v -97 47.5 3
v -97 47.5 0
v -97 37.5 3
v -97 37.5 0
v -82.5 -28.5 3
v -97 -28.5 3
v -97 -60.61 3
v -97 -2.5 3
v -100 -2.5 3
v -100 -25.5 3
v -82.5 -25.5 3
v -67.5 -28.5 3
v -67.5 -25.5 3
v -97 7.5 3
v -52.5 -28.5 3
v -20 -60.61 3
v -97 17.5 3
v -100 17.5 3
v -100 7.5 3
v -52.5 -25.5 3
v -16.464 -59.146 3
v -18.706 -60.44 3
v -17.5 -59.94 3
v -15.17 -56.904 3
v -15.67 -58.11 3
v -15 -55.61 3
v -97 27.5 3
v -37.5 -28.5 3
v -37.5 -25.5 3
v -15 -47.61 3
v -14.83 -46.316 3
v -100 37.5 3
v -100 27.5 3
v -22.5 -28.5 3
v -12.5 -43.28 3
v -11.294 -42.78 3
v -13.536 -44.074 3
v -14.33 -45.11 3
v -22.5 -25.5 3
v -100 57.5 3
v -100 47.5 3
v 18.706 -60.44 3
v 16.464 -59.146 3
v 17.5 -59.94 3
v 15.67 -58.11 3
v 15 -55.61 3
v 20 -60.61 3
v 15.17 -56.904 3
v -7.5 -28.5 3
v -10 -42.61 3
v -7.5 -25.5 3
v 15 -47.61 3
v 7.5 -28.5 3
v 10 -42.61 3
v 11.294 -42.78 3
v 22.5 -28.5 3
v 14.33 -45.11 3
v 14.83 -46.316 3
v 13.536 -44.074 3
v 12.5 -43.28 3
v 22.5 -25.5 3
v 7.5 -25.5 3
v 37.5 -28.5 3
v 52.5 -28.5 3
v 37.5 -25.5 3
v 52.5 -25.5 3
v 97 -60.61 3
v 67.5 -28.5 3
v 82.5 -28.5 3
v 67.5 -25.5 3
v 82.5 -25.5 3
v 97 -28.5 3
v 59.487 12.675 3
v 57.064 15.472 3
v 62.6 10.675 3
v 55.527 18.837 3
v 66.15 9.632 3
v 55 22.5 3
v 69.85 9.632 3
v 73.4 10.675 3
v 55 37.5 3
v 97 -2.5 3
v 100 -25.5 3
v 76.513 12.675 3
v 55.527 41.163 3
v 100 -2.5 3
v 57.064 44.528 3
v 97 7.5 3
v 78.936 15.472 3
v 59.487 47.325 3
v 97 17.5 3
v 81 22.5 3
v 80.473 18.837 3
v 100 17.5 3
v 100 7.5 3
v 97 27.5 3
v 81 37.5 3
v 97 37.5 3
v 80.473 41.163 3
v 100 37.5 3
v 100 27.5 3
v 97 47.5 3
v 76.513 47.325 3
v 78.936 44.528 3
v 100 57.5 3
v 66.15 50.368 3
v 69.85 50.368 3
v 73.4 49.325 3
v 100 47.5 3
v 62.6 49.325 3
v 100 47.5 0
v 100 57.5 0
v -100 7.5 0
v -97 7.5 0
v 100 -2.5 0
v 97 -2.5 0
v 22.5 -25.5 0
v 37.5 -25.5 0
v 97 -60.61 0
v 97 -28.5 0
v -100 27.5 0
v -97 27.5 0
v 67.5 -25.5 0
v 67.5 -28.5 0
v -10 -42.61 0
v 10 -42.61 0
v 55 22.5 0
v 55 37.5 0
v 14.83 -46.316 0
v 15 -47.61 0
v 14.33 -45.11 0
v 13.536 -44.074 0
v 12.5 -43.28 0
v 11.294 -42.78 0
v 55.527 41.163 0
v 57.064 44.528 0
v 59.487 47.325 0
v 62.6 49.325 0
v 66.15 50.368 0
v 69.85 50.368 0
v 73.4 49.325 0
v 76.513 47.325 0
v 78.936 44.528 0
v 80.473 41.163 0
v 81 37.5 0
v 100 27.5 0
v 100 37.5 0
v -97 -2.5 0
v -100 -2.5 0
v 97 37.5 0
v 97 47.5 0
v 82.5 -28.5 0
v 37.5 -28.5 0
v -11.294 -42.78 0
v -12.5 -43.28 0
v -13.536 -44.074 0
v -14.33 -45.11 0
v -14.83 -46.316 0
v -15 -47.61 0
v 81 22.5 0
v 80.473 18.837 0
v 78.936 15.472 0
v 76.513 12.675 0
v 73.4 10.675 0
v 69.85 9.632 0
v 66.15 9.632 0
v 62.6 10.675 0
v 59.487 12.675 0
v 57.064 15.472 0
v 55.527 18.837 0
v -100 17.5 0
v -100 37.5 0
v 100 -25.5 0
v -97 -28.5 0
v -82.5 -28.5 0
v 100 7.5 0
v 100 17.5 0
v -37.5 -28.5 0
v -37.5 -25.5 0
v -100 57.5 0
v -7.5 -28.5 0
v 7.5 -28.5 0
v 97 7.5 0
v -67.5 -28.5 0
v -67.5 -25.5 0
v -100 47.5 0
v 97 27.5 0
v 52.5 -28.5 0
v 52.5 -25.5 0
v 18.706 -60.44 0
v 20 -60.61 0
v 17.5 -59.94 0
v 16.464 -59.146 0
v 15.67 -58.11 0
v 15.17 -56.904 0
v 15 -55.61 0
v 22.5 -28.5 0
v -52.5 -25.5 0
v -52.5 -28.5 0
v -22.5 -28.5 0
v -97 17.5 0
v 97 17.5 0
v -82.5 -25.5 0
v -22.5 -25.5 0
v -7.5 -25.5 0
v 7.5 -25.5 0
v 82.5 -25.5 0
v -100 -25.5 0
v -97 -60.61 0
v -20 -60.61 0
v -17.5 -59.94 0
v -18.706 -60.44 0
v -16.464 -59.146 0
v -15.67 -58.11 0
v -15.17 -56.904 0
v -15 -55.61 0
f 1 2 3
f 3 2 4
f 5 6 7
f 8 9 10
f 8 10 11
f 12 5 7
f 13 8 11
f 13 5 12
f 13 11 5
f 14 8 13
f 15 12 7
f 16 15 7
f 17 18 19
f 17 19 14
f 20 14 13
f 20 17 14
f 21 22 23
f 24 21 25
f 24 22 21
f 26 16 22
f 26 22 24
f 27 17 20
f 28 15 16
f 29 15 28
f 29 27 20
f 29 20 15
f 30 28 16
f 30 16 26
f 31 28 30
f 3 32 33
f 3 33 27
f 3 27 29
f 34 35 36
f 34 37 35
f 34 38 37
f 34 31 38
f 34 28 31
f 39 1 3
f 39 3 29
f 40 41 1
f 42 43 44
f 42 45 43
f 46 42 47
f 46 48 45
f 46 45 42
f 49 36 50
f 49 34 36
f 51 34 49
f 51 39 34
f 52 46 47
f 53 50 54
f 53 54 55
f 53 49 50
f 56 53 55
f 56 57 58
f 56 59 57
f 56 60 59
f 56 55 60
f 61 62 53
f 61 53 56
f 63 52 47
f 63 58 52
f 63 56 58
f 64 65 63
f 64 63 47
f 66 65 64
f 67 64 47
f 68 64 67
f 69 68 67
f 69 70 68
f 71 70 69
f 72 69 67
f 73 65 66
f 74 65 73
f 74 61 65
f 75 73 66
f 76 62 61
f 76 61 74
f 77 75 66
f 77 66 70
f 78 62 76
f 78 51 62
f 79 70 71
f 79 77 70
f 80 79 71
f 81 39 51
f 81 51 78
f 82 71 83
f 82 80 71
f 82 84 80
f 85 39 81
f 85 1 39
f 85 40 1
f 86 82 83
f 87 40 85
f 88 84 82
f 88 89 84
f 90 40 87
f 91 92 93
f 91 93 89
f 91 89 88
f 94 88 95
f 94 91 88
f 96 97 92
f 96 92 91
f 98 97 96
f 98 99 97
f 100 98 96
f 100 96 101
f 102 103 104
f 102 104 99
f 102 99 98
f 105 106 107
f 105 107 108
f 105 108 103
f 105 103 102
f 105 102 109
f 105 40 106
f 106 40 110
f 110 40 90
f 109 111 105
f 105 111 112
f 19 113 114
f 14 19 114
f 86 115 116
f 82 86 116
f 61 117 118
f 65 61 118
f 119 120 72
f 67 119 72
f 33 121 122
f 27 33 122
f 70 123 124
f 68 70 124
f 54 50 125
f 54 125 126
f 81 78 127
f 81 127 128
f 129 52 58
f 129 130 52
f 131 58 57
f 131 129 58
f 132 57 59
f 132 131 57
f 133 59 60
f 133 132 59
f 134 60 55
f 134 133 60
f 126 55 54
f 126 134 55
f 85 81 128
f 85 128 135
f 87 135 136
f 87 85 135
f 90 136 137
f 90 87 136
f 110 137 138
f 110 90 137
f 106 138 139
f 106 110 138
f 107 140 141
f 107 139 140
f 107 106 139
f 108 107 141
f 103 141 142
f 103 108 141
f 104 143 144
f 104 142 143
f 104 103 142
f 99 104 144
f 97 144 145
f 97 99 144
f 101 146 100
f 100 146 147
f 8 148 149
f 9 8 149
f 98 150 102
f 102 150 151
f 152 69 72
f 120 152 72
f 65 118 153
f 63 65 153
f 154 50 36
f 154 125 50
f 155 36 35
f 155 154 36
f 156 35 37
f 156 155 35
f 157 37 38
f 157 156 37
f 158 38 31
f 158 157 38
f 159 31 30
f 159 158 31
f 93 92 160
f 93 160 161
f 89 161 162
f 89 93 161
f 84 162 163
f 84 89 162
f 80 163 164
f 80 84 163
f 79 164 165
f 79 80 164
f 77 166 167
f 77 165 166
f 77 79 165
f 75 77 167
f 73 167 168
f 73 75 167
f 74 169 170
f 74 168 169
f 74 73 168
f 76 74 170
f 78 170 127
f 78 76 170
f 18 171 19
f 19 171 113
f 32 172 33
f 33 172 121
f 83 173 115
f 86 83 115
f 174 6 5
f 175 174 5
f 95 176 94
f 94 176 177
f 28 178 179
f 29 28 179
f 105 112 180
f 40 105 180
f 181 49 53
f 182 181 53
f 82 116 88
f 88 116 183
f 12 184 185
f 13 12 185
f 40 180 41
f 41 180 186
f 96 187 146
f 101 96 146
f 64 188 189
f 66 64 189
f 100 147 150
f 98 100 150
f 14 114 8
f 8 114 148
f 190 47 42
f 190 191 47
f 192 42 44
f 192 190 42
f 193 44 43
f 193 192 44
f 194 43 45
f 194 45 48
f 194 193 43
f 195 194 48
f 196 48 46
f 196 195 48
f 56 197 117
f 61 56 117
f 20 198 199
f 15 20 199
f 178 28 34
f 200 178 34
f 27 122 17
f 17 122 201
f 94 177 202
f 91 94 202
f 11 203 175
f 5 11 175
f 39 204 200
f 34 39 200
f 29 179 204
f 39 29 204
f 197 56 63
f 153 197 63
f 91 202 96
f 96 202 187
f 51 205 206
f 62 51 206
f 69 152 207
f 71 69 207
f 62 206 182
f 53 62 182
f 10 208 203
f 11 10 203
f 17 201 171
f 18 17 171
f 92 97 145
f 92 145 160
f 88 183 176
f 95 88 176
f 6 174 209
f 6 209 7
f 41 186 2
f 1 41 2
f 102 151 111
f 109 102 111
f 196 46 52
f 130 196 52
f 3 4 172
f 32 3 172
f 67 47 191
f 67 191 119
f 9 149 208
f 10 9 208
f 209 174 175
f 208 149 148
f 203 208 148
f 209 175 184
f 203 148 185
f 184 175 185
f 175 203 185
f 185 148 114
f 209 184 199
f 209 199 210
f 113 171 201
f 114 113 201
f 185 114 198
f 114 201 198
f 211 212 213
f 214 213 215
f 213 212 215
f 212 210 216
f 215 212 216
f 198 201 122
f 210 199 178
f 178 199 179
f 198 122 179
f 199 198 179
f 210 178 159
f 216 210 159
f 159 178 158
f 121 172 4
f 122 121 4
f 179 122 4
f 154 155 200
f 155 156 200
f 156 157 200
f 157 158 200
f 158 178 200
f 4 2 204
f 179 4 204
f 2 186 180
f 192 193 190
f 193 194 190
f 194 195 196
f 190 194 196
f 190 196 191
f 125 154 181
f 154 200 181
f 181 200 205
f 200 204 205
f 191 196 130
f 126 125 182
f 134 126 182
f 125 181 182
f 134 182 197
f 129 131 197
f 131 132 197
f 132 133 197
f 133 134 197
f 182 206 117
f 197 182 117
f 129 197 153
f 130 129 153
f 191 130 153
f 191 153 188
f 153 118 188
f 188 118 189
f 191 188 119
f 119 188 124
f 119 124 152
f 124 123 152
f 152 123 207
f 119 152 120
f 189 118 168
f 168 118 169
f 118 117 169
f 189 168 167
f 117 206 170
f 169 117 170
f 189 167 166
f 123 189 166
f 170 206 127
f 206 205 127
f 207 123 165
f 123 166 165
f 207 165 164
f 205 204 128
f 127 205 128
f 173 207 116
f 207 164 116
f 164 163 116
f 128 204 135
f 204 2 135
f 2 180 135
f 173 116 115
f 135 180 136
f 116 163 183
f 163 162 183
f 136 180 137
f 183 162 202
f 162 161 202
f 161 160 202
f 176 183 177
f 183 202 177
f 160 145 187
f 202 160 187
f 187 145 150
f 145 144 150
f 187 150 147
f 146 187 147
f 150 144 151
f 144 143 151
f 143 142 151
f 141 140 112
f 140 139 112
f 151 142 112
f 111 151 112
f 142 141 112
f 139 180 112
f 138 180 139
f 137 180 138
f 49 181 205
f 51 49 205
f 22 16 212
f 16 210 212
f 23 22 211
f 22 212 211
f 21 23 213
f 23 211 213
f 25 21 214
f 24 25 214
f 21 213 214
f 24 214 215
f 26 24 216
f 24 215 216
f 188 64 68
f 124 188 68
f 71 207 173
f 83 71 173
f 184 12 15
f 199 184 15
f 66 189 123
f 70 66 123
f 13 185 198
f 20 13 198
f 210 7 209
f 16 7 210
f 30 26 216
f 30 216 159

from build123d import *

# Parameters (mm, degrees)
BOSS_EXTRUDE1_DEPTH = 3
CUT_EXTRUDE1_DEPTH  = 10
SKETCH3_W           = 194
SKETCH3_H           = 3
BOSS_EXTRUDE2_DEPTH = 32.11
SKETCH4_W           = 30
SKETCH4_H           = 18
CUT_EXTRUDE2_DEPTH  = 22
FILLET1_R           = 5
FILLET2_R           = 5


with BuildPart() as part:
    # Sketch1 → Boss-Extrude1 (new body)
    with BuildSketch(Plane.XY):
        Polygon((100, -2.5), (97, -2.5), (97, 7.5), (100, 7.5), (100, 17.5), (97, 17.5), (97, 27.5), (100, 27.5), (100, 37.5), (97, 37.5), (97, 47.5), (100, 47.5), (100, 57.5), (97, 57.5), (-97, 57.5), (-100, 57.5), (-100, 47.5), (-97, 47.5), (-97, 37.5), (-100, 37.5), (-100, 27.5), (-97, 27.5), (-97, 17.5), (-100, 17.5), (-100, 7.5), (-97, 7.5), (-97, -2.5), (-100, -2.5), (-100, -25.5), (-97, -25.5), (-82.5, -25.5), (-82.5, -28.5), (-67.5, -28.5), (-67.5, -25.5), (-52.5, -25.5), (-52.5, -28.5), (-37.5, -28.5), (-37.5, -25.5), (-22.5, -25.5), (-22.5, -28.5), (-7.5, -28.5), (-7.5, -25.5), (0, -25.5), (7.5, -25.5), (7.5, -28.5), (22.5, -28.5), (22.5, -25.5), (30, -25.5), (37.5, -25.5), (37.5, -28.5), (52.5, -28.5), (52.5, -25.5), (60, -25.5), (67.5, -25.5), (67.5, -28.5), (82.5, -28.5), (82.5, -25.5), (97, -25.5), (100, -25.5), align=None)
    extrude(amount=BOSS_EXTRUDE1_DEPTH)

    # Sketch2 → Cut-Extrude1 (cut)
    with BuildSketch(Plane.XY.offset(3)):
        with BuildLine():
            Line((55, 22.5), (55, 37.5))
            ThreePointArc((55, 37.5), (68, 50.5), (81, 37.5))
            Line((81, 37.5), (81, 22.5))
            ThreePointArc((81, 22.5), (68, 9.5), (55, 22.5))
        make_face()
    extrude(amount=-CUT_EXTRUDE1_DEPTH, mode=Mode.SUBTRACT)

    # Sketch3 → Boss-Extrude2 (add)
    with BuildSketch(Plane.XZ.offset(28.5)):
        with Locations((0, 1.5)):
            Rectangle(SKETCH3_W, SKETCH3_H)
    extrude(amount=BOSS_EXTRUDE2_DEPTH)

    # Sketch4 → Cut-Extrude2 (cut)
    with BuildSketch(Plane.XY.offset(3)):
        with Locations((0, -51.61)):
            Rectangle(SKETCH4_W, SKETCH4_H)
    extrude(amount=-CUT_EXTRUDE2_DEPTH, mode=Mode.SUBTRACT)

    # Fillet1
    fillet1_edges = [part.edges().sort_by_distance(p)[0] for p in [
        (15, -60.61, 1.5),
        (-15, -60.61, 1.5),
    ]]
    fillet(fillet1_edges, radius=FILLET1_R)

    # Fillet2
    fillet2_edges = [part.edges().sort_by_distance(p)[0] for p in [
        (-15, -42.61, 1.5),
        (15, -42.61, 1.5),
    ]]
    fillet(fillet2_edges, radius=FILLET2_R)


solid = part.part
